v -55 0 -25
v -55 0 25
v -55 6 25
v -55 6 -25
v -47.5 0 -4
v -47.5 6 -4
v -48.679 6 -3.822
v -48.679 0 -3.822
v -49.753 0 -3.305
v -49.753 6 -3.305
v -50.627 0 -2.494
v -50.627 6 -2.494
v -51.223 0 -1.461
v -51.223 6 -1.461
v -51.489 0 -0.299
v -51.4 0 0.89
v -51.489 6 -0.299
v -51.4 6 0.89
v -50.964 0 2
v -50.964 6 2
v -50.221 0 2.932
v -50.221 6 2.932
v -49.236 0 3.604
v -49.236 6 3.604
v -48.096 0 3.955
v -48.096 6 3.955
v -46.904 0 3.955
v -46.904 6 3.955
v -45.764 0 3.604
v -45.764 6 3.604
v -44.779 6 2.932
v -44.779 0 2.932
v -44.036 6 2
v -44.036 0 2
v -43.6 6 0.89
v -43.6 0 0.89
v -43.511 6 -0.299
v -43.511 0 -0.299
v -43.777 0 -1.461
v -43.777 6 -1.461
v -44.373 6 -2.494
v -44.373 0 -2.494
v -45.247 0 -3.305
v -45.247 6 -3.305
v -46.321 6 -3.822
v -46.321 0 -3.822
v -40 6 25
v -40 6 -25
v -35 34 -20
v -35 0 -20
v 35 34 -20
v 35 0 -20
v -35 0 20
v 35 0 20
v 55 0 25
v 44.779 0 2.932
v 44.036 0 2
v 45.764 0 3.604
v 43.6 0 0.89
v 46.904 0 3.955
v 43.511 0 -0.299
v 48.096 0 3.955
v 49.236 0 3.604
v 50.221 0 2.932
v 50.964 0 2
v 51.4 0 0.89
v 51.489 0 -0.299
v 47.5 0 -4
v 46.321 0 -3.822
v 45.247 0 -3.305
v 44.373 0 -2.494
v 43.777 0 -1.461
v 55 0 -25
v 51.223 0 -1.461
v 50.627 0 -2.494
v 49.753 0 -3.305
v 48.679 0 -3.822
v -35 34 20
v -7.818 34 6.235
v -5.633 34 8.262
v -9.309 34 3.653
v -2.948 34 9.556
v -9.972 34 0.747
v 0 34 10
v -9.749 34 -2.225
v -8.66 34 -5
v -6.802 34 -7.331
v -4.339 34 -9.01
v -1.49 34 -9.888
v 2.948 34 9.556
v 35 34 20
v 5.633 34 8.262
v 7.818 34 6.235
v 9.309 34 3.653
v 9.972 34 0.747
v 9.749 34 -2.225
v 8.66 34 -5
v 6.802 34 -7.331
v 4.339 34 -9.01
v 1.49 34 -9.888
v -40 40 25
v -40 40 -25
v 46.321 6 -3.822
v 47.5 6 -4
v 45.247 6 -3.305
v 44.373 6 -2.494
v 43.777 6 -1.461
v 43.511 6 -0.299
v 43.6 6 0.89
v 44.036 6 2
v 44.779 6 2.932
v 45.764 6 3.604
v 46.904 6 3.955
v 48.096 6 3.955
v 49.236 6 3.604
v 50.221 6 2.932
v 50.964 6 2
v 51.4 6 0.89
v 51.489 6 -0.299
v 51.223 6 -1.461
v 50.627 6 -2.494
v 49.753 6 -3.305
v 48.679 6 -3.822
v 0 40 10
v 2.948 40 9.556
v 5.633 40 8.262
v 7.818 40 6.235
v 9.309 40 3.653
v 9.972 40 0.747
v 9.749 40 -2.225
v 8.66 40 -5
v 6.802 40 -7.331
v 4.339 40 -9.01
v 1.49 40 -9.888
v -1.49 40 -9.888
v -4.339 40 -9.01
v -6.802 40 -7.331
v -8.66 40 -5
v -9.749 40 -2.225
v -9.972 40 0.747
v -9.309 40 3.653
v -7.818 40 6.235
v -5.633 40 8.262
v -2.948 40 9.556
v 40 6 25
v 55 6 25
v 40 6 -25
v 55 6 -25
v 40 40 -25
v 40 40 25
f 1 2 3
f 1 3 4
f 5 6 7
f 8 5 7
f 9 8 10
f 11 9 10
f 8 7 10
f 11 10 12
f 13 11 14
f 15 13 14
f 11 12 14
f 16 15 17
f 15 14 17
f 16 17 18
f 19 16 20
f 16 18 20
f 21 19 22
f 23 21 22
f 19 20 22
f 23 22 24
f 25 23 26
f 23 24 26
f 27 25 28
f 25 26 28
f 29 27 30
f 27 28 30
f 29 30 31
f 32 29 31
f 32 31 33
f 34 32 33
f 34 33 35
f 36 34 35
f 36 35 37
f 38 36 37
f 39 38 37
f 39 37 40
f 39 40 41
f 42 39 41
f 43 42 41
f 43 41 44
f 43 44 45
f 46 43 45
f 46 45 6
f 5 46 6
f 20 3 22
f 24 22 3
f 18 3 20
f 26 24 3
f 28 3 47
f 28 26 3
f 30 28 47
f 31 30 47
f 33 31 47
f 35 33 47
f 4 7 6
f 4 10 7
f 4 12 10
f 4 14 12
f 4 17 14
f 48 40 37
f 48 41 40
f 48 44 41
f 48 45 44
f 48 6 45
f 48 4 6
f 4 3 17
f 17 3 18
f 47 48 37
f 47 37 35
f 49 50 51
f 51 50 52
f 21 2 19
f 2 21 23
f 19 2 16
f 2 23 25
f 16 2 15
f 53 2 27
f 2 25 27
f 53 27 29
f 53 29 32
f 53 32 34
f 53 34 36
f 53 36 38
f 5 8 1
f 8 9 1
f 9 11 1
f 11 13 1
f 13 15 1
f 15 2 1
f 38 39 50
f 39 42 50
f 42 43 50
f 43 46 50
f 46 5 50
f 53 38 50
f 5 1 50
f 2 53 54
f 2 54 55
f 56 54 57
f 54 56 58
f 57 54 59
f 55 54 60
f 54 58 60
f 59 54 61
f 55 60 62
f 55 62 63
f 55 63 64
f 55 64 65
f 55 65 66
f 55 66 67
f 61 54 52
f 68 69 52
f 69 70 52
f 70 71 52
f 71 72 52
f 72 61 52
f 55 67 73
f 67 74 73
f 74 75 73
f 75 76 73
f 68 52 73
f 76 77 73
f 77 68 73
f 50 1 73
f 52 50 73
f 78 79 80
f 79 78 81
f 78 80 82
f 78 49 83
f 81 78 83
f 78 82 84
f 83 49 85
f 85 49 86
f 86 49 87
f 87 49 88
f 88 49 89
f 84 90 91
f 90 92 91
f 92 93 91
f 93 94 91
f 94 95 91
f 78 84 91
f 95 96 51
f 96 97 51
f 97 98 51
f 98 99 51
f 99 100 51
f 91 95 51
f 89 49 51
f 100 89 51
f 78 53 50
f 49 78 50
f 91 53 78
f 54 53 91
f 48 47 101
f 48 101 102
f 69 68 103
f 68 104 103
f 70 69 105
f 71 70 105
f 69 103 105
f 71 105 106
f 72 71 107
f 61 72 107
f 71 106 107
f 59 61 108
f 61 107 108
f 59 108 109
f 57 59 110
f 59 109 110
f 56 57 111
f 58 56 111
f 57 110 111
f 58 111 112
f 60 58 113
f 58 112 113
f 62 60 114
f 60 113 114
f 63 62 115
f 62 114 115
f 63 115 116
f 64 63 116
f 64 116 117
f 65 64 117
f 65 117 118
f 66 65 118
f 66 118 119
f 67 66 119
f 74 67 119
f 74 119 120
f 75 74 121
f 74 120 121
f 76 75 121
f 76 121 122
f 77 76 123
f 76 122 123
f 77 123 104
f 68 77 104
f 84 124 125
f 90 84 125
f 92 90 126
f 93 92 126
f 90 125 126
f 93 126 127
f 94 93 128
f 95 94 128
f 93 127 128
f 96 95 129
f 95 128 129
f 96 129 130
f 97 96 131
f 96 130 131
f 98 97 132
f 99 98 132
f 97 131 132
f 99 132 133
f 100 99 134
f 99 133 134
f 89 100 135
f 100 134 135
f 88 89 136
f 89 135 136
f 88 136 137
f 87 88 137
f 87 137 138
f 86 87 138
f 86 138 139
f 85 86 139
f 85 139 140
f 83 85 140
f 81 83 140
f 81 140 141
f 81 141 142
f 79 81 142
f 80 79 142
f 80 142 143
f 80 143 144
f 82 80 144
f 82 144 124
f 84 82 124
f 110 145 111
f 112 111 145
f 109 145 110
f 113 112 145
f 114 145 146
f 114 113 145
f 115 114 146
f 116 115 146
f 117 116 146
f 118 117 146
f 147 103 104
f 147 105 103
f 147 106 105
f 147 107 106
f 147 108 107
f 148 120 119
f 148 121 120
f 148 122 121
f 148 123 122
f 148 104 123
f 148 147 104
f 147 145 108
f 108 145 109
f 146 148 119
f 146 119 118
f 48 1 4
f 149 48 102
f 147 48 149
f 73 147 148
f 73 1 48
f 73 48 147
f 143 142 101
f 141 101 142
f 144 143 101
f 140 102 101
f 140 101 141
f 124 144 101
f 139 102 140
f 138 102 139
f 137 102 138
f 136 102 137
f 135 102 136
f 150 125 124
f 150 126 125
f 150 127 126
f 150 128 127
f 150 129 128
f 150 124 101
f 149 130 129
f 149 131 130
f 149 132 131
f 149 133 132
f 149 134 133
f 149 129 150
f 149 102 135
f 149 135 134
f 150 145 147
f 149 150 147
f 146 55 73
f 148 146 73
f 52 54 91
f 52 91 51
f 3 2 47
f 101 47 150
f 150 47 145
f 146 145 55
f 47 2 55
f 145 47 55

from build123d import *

# Parameters (mm, degrees)
SKETCH_1_W          = 110
SKETCH_1_H          = 50
EXTRUDE_1_DEPTH     = 6
SKETCH_2_W          = 80
SKETCH_2_H          = 50
EXTRUDE_2_DEPTH     = 34
SKETCH_3_W          = 70
SKETCH_3_H          = 40
CUT_EXTRUDE_1_DEPTH = 28
SKETCH_4_R          = 10
CUT_EXTRUDE_2_DEPTH = 73.456883731
SKETCH_5_R          = 4
CUT_EXTRUDE_3_DEPTH = 111
SKETCH_6_W          = 70
SKETCH_6_H          = 40
CUT_EXTRUDE_4_DEPTH = 6


with BuildPart() as part:
    # 草图1 → 凸台-拉伸1 (new body)
    with BuildSketch(Plane(origin=(0, 0, 0), x_dir=(1, 0, 0), z_dir=(0, 1, 0))):
        Rectangle(SKETCH_1_W, SKETCH_1_H)
    extrude(amount=EXTRUDE_1_DEPTH)

    # 草图2 → 凸台-拉伸2 (add)
    with BuildSketch(Plane(origin=(0, 6, 0), x_dir=(1, 0, 0), z_dir=(0, 1, 0))):
        Rectangle(SKETCH_2_W, SKETCH_2_H)
    extrude(amount=EXTRUDE_2_DEPTH)

    # 草图3 → 切除-拉伸1 (cut)
    with BuildSketch(Plane(origin=(0, 6, 0), x_dir=(1, 0, 0), z_dir=(0, 1, 0))):
        Rectangle(SKETCH_3_W, SKETCH_3_H)
    extrude(amount=CUT_EXTRUDE_1_DEPTH, mode=Mode.SUBTRACT)

    # 草图4 → 切除-拉伸2 (cut, through all)
    with BuildSketch(Plane(origin=(0, 40, 0), x_dir=(1, 0, 0), z_dir=(0, 1, 0))):
        with Locations(Location((0, 0, 0), (0, 0, 270))):
            Circle(SKETCH_4_R)
    extrude(amount=-CUT_EXTRUDE_2_DEPTH, mode=Mode.SUBTRACT)

    # 草图5 → 切除-拉伸3 (cut, symmetric)
    with BuildSketch(Plane(origin=(0, 6, 0), x_dir=(1, 0, 0), z_dir=(0, 1, 0))):
        with Locations(Location((-47.5, 0, 0), (0, 0, 90))):
            Circle(SKETCH_5_R)
        with Locations(Location((47.5, 0, 0), (0, 0, 90))):
            Circle(SKETCH_5_R)
    extrude(amount=CUT_EXTRUDE_3_DEPTH, both=True, mode=Mode.SUBTRACT)

    # 草图6 → 切除-拉伸4 (cut)
    with BuildSketch(Plane(origin=(0, 0, 0), x_dir=(1, 0, 0), z_dir=(0, 1, 0))):
        Rectangle(SKETCH_6_W, SKETCH_6_H)
    extrude(amount=CUT_EXTRUDE_4_DEPTH, mode=Mode.SUBTRACT)


solid = part.part
